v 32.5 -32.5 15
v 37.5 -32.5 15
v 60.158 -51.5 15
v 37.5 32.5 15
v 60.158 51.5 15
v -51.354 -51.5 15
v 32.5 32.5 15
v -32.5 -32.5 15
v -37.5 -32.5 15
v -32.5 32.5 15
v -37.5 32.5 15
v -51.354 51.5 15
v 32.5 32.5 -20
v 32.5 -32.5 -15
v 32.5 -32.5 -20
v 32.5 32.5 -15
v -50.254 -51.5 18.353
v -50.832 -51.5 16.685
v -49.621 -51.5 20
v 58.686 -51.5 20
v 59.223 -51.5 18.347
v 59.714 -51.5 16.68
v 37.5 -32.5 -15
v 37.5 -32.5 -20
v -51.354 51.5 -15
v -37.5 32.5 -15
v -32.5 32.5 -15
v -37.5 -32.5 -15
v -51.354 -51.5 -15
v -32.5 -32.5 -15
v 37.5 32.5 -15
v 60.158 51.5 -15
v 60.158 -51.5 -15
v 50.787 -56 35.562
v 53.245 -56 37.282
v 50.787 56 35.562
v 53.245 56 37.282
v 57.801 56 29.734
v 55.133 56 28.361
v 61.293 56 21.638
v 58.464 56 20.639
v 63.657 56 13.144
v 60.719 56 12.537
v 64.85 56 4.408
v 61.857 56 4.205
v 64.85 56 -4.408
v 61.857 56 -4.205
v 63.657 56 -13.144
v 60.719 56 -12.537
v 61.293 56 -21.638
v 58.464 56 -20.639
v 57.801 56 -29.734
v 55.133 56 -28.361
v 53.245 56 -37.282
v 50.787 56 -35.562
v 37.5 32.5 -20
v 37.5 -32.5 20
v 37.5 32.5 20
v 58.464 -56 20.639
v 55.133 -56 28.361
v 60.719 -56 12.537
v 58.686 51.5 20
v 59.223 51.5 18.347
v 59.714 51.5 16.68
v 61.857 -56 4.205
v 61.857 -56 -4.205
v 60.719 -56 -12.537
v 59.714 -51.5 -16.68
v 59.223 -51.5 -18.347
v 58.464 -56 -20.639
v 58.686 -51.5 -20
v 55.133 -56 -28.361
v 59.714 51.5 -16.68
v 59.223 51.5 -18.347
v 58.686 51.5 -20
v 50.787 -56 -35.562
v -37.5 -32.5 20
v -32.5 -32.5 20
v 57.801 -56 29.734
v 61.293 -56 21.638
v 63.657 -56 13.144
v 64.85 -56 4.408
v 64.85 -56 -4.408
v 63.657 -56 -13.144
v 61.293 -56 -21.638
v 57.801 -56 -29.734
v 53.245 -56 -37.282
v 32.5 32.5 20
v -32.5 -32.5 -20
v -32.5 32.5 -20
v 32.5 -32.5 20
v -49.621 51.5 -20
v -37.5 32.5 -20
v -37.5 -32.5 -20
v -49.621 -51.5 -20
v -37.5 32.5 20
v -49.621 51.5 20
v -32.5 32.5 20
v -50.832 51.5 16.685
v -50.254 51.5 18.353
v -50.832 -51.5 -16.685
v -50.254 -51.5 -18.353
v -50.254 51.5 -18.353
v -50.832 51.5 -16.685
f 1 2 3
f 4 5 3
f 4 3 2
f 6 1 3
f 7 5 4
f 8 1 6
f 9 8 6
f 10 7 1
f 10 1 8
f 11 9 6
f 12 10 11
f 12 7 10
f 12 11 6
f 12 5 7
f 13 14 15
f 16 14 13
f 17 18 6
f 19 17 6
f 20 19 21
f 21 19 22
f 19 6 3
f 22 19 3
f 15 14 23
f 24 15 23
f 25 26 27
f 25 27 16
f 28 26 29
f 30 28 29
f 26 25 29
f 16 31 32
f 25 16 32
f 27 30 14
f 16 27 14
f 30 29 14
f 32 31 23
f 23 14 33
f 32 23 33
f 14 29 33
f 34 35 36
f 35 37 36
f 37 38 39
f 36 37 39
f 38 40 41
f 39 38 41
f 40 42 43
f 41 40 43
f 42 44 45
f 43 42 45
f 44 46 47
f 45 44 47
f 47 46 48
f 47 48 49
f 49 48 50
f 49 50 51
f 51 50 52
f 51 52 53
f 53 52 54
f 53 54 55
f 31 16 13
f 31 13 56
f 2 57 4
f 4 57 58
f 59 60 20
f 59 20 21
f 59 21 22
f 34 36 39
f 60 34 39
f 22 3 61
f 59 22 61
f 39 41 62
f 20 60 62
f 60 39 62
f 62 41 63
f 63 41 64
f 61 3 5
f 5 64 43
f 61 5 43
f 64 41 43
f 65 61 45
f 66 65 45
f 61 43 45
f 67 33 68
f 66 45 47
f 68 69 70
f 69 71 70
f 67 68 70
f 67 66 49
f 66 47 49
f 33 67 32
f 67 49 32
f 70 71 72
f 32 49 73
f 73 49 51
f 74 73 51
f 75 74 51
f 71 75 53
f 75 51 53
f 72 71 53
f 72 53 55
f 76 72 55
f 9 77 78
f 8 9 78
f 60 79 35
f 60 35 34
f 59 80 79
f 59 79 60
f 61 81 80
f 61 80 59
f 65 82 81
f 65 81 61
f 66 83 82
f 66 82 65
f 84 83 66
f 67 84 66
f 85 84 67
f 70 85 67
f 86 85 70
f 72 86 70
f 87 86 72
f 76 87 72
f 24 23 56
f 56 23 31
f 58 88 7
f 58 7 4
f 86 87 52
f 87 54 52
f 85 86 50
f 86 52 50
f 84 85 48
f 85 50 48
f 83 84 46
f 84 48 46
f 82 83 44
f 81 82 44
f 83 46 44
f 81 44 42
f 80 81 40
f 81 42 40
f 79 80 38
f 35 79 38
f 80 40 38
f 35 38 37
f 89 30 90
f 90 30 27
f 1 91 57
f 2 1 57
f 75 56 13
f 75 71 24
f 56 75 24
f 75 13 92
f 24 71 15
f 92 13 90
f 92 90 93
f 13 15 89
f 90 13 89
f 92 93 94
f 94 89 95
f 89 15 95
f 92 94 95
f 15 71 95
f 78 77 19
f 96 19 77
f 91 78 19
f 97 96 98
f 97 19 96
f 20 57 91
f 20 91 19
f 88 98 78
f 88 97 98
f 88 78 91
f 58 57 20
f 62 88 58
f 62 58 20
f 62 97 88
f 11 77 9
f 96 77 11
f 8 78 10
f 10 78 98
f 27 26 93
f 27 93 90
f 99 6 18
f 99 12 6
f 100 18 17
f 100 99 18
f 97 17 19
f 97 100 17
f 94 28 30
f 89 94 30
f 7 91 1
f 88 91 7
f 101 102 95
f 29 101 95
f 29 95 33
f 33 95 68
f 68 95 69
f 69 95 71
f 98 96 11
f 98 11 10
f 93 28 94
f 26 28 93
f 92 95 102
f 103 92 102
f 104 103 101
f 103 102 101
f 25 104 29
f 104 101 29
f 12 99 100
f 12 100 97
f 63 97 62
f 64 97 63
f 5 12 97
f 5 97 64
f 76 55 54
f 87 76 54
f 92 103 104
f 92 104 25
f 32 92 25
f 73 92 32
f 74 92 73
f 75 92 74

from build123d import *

# Parameters (mm, degrees)
BOSS_EXTRUDE1_DEPTH = 56
BOSS_EXTRUDE2_DEPTH = 51.5
CUT_EXTRUDE1_REACH  = 105.161
SKETCH3_W           = 5
SKETCH3_H           = 65


with BuildPart() as part:
    # Sketch1 → Boss-Extrude1 (new, symmetric)
    with BuildSketch(Plane(origin=(0, 0, 0), x_dir=(1, 0, 0), z_dir=(0, 1, 0))):
        with BuildLine():
            Line((50.787426746, 35.561739054), (53.244882879, 37.282468363))
            ThreePointArc((53.244882879, 37.282468363), (65, 0), (53.244882879, -37.282468363))
            Line((53.244882879, -37.282468363), (50.787426746, -35.561739054))
            ThreePointArc((50.787426746, -35.561739054), (62, 0), (50.787426746, 35.561739054))
        make_face()
    extrude(amount=BOSS_EXTRUDE1_DEPTH, both=True)

    # Sketch2 → Boss-Extrude2 (add, symmetric)
    with BuildSketch(Plane(origin=(0, 0, 0), x_dir=(1, 0, 0), z_dir=(0, 1, 0))):
        with BuildLine():
            Line((-51.354162441, 15), (60.158124971, 15))
            ThreePointArc((60.158124971, 15), (59.474430807, 17.515481159), (58.685603004, 20))
            Line((58.685603004, 20), (-49.621064076, 20))
            ThreePointArc((-49.621064076, 20), (-50.549471733, 17.521441364), (-51.354162441, 15))
        make_face()
        with BuildLine():
            Line((-49.621064076, -20), (58.685603004, -20))
            ThreePointArc((58.685603004, -20), (59.474430807, -17.515481159), (60.158124971, -15))
            Line((60.158124971, -15), (-51.354162441, -15))
            ThreePointArc((-51.354162441, -15), (-50.549471733, -17.521441364), (-49.621064076, -20))
        make_face()
    extrude(amount=BOSS_EXTRUDE2_DEPTH, both=True)

    # Cut-Extrude1: up to this face of the body (flat: up to its plane)
    cut_extrude1_end = Plane(part.part.faces().sort_by_distance((4.532269464, 0, -20))[0])
    # Sketch3 → Cut-Extrude1 (cut, up to the picked face)
    with BuildSketch(Plane.XY.offset(20), mode=Mode.PRIVATE) as cut_extrude1_sk1:
        with Locations((-35, 0)):
            Rectangle(SKETCH3_W, SKETCH3_H)
    cut_extrude1_tool1 = split(extrude(cut_extrude1_sk1.sketch, amount=-CUT_EXTRUDE1_REACH, mode=Mode.PRIVATE), bisect_by=cut_extrude1_end, keep=Keep.BOTH, mode=Mode.PRIVATE)
    # Sketch3 → Cut-Extrude1 (cut, up to the picked face)
    with BuildSketch(Plane.XY.offset(20), mode=Mode.PRIVATE) as cut_extrude1_sk2:
        with Locations((35, 0)):
            Rectangle(SKETCH3_W, SKETCH3_H)
    cut_extrude1_tool2 = split(extrude(cut_extrude1_sk2.sketch, amount=-CUT_EXTRUDE1_REACH, mode=Mode.PRIVATE), bisect_by=cut_extrude1_end, keep=Keep.BOTH, mode=Mode.PRIVATE)
    add(cut_extrude1_tool1.solids().sort_by(Axis((-35, 0, 20), (0, 0, -1)))[0], mode=Mode.SUBTRACT)
    add(cut_extrude1_tool2.solids().sort_by(Axis((35, 0, 20), (0, 0, -1)))[0], mode=Mode.SUBTRACT)


solid = part.part
